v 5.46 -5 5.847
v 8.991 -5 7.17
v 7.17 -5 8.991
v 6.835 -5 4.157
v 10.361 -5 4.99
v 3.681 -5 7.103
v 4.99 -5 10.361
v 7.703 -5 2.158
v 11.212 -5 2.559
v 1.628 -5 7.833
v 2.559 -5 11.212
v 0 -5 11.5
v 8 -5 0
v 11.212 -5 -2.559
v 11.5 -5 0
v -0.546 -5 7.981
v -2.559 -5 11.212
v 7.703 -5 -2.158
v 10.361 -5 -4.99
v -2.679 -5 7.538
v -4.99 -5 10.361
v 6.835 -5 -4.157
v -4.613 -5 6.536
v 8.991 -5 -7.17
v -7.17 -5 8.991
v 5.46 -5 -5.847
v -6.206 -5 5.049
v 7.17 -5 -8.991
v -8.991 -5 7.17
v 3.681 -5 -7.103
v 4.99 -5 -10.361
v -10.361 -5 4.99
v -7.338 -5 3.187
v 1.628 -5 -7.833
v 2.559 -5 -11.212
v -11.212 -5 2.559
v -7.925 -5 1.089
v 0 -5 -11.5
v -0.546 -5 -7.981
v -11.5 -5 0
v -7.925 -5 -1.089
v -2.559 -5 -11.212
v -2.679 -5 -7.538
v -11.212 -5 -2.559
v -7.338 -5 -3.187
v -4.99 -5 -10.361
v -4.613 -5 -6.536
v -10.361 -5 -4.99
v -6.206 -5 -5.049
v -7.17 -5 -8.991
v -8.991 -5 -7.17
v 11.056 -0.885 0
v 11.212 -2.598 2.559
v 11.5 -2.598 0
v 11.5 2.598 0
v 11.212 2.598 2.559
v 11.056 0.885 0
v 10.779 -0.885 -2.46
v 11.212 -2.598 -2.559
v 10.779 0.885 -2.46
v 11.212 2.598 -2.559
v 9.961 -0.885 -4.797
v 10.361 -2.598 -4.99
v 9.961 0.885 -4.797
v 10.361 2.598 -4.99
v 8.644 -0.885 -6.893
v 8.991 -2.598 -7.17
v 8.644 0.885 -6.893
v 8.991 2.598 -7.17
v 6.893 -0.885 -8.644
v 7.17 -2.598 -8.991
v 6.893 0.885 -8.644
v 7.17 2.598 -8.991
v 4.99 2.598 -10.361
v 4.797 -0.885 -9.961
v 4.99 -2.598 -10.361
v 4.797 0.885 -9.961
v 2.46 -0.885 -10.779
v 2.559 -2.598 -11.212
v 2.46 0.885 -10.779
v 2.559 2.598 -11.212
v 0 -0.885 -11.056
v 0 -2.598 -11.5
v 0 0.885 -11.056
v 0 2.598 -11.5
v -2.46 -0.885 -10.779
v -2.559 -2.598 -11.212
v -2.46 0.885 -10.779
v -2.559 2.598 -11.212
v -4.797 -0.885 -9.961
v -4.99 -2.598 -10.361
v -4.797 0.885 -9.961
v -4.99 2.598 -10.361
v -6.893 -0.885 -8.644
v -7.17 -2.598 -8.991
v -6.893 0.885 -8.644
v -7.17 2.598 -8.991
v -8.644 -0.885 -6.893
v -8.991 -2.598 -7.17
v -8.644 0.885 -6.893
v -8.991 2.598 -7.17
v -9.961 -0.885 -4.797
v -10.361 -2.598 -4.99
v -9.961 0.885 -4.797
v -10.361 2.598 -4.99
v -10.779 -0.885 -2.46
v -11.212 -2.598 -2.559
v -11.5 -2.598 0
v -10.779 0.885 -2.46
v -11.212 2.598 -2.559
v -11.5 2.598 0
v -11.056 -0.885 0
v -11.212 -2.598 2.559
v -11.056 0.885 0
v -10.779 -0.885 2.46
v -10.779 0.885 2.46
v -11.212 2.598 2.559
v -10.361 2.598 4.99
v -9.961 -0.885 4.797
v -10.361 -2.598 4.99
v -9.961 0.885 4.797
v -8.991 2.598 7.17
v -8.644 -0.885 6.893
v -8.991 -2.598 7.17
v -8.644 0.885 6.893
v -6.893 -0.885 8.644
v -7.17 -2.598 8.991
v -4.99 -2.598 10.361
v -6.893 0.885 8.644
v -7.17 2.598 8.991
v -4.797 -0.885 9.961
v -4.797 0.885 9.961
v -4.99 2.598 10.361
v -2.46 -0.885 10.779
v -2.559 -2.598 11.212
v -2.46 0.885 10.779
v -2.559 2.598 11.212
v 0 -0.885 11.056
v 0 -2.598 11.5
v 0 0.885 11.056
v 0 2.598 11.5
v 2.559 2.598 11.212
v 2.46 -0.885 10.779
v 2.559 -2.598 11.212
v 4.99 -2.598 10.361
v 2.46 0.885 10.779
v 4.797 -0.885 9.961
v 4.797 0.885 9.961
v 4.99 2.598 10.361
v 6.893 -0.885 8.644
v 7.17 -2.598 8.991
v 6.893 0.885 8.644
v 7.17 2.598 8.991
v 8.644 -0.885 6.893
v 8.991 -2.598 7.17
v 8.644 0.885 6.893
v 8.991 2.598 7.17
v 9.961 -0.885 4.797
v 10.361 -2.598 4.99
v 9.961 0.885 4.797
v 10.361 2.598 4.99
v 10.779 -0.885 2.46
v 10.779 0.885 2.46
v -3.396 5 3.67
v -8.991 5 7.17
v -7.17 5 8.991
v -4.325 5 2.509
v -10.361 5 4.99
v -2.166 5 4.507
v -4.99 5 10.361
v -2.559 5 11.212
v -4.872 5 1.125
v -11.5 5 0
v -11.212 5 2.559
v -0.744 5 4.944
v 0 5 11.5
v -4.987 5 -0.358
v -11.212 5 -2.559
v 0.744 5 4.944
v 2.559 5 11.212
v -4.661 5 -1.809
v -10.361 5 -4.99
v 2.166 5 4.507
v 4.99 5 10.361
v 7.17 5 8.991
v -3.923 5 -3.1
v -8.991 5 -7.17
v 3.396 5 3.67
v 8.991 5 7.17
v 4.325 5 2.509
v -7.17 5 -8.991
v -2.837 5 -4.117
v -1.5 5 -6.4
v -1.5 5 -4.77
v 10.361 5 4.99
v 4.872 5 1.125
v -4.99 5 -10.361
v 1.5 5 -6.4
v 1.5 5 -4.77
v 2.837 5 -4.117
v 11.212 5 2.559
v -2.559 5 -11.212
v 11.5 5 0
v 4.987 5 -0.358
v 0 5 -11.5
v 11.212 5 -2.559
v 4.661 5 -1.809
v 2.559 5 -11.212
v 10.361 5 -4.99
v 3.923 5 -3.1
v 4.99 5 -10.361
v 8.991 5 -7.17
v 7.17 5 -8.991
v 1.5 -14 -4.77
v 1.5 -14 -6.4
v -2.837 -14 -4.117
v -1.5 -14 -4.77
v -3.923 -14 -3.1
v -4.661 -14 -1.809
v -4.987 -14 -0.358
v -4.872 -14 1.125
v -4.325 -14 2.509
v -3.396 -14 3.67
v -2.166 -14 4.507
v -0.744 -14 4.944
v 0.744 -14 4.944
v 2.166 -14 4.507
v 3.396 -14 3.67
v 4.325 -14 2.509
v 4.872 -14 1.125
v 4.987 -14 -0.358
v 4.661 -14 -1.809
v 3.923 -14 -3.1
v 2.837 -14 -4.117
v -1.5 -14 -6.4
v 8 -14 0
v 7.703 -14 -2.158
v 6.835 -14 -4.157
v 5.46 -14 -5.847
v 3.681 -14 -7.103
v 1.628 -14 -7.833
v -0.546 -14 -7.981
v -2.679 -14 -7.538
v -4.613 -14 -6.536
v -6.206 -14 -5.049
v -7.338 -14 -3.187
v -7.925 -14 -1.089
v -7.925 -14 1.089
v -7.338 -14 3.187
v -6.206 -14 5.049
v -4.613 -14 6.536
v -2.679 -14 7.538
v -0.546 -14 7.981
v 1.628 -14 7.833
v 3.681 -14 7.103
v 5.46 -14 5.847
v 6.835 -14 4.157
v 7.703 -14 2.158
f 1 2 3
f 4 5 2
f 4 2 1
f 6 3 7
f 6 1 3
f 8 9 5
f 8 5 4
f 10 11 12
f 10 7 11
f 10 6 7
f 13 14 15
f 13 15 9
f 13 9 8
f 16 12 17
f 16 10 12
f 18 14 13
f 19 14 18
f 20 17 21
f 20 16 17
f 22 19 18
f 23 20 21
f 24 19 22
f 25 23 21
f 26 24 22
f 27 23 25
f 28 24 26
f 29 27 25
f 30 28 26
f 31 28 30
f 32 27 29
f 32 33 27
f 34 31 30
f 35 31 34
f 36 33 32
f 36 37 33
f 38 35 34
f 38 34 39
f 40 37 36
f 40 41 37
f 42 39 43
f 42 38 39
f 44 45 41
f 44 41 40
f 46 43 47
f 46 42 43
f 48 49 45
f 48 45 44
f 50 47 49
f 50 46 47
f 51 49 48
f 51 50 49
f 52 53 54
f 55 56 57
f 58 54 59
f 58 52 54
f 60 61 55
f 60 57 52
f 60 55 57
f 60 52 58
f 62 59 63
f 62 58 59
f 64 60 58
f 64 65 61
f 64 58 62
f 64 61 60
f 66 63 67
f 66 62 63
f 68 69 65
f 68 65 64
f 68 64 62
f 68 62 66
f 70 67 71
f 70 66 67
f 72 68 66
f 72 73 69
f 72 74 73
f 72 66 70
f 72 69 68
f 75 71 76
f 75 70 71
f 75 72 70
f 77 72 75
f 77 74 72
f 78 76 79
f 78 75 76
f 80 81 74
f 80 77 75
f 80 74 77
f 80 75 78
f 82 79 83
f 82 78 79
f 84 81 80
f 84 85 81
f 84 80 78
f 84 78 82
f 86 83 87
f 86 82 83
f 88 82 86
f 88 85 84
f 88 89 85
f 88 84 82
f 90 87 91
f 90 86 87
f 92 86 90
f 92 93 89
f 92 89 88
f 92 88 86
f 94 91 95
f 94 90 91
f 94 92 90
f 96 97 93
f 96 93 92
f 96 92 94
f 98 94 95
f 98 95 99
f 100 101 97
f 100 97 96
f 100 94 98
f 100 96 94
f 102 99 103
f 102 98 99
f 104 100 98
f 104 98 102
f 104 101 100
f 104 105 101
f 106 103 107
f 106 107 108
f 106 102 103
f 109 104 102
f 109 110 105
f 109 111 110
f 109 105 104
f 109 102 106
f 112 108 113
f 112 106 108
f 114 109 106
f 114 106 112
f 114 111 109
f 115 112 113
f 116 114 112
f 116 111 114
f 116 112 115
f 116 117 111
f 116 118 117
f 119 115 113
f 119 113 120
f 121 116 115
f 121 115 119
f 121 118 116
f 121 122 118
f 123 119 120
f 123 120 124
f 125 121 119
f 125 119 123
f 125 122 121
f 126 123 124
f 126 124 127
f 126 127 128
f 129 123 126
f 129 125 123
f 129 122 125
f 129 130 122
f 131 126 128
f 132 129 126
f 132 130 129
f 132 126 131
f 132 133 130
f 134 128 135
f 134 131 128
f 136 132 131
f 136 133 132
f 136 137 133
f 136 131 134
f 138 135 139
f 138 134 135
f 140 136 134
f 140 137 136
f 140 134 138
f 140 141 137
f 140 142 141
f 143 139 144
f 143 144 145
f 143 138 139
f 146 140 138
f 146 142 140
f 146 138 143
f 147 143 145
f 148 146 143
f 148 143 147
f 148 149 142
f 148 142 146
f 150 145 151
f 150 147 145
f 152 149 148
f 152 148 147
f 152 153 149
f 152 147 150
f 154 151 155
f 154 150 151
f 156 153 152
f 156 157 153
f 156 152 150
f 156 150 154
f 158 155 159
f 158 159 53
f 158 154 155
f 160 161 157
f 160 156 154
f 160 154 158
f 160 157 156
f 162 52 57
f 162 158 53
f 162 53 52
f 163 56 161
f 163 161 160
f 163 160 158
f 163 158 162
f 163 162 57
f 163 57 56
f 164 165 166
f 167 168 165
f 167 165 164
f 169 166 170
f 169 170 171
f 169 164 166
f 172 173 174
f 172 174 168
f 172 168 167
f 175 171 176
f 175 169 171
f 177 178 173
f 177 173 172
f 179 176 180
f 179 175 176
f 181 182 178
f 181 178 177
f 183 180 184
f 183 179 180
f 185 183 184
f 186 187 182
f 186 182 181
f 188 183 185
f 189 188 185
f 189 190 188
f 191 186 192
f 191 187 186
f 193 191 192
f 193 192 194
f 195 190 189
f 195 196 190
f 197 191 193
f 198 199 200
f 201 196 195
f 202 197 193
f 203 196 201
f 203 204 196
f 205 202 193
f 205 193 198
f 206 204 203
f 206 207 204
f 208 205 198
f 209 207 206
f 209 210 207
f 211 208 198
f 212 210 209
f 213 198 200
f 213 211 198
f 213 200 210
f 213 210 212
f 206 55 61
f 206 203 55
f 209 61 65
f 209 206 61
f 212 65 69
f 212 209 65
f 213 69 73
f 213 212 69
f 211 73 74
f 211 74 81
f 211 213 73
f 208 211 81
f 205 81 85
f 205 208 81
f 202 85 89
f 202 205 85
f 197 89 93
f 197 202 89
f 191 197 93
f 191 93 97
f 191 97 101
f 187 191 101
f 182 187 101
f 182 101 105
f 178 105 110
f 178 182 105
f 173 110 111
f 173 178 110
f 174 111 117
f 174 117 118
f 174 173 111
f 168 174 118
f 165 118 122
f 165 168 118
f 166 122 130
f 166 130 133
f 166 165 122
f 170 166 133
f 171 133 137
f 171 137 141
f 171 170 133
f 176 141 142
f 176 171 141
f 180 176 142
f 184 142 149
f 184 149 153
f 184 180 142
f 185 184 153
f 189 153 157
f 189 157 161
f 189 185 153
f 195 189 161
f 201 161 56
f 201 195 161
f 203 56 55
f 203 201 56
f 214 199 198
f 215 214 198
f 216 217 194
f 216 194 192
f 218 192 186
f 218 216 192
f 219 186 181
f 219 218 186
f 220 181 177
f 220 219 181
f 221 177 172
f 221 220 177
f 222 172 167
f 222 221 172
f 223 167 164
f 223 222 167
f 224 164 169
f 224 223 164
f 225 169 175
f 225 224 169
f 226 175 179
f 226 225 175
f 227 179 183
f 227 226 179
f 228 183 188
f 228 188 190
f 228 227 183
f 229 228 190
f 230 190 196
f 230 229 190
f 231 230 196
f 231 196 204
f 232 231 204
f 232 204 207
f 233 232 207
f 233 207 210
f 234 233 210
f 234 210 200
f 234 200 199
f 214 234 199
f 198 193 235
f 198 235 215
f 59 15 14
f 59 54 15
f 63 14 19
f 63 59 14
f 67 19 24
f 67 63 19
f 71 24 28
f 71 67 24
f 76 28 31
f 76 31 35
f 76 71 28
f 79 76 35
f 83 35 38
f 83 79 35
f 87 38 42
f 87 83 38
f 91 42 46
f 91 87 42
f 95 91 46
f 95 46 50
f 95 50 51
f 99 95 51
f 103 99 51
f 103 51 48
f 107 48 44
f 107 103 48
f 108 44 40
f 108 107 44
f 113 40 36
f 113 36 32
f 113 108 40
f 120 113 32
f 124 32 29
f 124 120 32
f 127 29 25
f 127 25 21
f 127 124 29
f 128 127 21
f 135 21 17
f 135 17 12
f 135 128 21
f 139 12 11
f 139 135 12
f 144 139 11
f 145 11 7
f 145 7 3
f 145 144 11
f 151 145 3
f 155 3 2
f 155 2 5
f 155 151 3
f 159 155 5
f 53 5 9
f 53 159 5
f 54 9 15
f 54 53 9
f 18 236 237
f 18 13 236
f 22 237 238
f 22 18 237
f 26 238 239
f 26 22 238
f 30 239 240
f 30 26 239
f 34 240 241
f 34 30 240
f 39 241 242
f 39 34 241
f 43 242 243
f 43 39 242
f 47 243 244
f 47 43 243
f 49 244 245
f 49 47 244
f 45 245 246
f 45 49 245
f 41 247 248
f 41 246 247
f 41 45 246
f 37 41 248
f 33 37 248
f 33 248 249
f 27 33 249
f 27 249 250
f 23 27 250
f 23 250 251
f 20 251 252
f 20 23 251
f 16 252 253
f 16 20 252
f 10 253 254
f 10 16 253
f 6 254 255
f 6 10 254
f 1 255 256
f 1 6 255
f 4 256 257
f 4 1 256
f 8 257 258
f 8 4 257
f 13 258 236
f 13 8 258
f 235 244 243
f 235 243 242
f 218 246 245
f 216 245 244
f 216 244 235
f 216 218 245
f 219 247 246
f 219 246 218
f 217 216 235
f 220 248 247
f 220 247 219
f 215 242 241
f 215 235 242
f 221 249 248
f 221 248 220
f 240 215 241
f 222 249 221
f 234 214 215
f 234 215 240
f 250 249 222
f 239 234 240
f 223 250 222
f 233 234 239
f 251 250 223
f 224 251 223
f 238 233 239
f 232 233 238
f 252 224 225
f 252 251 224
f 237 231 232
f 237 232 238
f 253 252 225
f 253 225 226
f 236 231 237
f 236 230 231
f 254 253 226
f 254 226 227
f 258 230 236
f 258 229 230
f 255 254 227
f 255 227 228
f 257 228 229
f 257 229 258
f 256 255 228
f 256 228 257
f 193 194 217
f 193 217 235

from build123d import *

# Parameters (mm, degrees)
ESQUISSE1_W             = 3
ESQUISSE1_H             = 2.8
ENL_V_MAT_EXTRU_1_DEPTH = 21
ESQUISSE2_R             = 8
ENL_V_MAT_EXTRU_2_DEPTH = 1


with BuildPart() as part:
    # Sketch1 → Revolve2 (revolve)
    with BuildSketch(Plane.XY):
        with BuildLine():
            Line((5, -15), (8, -15))
            Line((8, -15), (8, -5))
            Line((8, -5), (11.5, -5))
            Line((11.5, -5), (11.5, -2.598076211))
            ThreePointArc((11.5, -2.598076211), (11, 0), (11.5, 2.598076211))
            Line((11.5, 2.598076211), (11.5, 5))
            Line((11.5, 5), (5, 5))
            Line((5, 5), (5, -15))
        make_face()
    revolve(axis=Axis((0, -15, 0), (0, 1, 0)))

    # Esquisse1 → Enlèv. mat.-Extru.1 (cut, through all)
    with BuildSketch(Plane(origin=(0, 5, 0), x_dir=(1, 0, 0), z_dir=(0, 1, 0))):
        with Locations((0, 5)):
            Rectangle(ESQUISSE1_W, ESQUISSE1_H)
    extrude(amount=-ENL_V_MAT_EXTRU_1_DEPTH, mode=Mode.SUBTRACT)

    # Esquisse2 → Enlèv. mat.-Extru.2 (cut)
    with BuildSketch(Plane.XZ.offset(15)):
        Circle(ESQUISSE2_R)
    extrude(amount=-ENL_V_MAT_EXTRU_2_DEPTH, mode=Mode.SUBTRACT)


solid = part.part
